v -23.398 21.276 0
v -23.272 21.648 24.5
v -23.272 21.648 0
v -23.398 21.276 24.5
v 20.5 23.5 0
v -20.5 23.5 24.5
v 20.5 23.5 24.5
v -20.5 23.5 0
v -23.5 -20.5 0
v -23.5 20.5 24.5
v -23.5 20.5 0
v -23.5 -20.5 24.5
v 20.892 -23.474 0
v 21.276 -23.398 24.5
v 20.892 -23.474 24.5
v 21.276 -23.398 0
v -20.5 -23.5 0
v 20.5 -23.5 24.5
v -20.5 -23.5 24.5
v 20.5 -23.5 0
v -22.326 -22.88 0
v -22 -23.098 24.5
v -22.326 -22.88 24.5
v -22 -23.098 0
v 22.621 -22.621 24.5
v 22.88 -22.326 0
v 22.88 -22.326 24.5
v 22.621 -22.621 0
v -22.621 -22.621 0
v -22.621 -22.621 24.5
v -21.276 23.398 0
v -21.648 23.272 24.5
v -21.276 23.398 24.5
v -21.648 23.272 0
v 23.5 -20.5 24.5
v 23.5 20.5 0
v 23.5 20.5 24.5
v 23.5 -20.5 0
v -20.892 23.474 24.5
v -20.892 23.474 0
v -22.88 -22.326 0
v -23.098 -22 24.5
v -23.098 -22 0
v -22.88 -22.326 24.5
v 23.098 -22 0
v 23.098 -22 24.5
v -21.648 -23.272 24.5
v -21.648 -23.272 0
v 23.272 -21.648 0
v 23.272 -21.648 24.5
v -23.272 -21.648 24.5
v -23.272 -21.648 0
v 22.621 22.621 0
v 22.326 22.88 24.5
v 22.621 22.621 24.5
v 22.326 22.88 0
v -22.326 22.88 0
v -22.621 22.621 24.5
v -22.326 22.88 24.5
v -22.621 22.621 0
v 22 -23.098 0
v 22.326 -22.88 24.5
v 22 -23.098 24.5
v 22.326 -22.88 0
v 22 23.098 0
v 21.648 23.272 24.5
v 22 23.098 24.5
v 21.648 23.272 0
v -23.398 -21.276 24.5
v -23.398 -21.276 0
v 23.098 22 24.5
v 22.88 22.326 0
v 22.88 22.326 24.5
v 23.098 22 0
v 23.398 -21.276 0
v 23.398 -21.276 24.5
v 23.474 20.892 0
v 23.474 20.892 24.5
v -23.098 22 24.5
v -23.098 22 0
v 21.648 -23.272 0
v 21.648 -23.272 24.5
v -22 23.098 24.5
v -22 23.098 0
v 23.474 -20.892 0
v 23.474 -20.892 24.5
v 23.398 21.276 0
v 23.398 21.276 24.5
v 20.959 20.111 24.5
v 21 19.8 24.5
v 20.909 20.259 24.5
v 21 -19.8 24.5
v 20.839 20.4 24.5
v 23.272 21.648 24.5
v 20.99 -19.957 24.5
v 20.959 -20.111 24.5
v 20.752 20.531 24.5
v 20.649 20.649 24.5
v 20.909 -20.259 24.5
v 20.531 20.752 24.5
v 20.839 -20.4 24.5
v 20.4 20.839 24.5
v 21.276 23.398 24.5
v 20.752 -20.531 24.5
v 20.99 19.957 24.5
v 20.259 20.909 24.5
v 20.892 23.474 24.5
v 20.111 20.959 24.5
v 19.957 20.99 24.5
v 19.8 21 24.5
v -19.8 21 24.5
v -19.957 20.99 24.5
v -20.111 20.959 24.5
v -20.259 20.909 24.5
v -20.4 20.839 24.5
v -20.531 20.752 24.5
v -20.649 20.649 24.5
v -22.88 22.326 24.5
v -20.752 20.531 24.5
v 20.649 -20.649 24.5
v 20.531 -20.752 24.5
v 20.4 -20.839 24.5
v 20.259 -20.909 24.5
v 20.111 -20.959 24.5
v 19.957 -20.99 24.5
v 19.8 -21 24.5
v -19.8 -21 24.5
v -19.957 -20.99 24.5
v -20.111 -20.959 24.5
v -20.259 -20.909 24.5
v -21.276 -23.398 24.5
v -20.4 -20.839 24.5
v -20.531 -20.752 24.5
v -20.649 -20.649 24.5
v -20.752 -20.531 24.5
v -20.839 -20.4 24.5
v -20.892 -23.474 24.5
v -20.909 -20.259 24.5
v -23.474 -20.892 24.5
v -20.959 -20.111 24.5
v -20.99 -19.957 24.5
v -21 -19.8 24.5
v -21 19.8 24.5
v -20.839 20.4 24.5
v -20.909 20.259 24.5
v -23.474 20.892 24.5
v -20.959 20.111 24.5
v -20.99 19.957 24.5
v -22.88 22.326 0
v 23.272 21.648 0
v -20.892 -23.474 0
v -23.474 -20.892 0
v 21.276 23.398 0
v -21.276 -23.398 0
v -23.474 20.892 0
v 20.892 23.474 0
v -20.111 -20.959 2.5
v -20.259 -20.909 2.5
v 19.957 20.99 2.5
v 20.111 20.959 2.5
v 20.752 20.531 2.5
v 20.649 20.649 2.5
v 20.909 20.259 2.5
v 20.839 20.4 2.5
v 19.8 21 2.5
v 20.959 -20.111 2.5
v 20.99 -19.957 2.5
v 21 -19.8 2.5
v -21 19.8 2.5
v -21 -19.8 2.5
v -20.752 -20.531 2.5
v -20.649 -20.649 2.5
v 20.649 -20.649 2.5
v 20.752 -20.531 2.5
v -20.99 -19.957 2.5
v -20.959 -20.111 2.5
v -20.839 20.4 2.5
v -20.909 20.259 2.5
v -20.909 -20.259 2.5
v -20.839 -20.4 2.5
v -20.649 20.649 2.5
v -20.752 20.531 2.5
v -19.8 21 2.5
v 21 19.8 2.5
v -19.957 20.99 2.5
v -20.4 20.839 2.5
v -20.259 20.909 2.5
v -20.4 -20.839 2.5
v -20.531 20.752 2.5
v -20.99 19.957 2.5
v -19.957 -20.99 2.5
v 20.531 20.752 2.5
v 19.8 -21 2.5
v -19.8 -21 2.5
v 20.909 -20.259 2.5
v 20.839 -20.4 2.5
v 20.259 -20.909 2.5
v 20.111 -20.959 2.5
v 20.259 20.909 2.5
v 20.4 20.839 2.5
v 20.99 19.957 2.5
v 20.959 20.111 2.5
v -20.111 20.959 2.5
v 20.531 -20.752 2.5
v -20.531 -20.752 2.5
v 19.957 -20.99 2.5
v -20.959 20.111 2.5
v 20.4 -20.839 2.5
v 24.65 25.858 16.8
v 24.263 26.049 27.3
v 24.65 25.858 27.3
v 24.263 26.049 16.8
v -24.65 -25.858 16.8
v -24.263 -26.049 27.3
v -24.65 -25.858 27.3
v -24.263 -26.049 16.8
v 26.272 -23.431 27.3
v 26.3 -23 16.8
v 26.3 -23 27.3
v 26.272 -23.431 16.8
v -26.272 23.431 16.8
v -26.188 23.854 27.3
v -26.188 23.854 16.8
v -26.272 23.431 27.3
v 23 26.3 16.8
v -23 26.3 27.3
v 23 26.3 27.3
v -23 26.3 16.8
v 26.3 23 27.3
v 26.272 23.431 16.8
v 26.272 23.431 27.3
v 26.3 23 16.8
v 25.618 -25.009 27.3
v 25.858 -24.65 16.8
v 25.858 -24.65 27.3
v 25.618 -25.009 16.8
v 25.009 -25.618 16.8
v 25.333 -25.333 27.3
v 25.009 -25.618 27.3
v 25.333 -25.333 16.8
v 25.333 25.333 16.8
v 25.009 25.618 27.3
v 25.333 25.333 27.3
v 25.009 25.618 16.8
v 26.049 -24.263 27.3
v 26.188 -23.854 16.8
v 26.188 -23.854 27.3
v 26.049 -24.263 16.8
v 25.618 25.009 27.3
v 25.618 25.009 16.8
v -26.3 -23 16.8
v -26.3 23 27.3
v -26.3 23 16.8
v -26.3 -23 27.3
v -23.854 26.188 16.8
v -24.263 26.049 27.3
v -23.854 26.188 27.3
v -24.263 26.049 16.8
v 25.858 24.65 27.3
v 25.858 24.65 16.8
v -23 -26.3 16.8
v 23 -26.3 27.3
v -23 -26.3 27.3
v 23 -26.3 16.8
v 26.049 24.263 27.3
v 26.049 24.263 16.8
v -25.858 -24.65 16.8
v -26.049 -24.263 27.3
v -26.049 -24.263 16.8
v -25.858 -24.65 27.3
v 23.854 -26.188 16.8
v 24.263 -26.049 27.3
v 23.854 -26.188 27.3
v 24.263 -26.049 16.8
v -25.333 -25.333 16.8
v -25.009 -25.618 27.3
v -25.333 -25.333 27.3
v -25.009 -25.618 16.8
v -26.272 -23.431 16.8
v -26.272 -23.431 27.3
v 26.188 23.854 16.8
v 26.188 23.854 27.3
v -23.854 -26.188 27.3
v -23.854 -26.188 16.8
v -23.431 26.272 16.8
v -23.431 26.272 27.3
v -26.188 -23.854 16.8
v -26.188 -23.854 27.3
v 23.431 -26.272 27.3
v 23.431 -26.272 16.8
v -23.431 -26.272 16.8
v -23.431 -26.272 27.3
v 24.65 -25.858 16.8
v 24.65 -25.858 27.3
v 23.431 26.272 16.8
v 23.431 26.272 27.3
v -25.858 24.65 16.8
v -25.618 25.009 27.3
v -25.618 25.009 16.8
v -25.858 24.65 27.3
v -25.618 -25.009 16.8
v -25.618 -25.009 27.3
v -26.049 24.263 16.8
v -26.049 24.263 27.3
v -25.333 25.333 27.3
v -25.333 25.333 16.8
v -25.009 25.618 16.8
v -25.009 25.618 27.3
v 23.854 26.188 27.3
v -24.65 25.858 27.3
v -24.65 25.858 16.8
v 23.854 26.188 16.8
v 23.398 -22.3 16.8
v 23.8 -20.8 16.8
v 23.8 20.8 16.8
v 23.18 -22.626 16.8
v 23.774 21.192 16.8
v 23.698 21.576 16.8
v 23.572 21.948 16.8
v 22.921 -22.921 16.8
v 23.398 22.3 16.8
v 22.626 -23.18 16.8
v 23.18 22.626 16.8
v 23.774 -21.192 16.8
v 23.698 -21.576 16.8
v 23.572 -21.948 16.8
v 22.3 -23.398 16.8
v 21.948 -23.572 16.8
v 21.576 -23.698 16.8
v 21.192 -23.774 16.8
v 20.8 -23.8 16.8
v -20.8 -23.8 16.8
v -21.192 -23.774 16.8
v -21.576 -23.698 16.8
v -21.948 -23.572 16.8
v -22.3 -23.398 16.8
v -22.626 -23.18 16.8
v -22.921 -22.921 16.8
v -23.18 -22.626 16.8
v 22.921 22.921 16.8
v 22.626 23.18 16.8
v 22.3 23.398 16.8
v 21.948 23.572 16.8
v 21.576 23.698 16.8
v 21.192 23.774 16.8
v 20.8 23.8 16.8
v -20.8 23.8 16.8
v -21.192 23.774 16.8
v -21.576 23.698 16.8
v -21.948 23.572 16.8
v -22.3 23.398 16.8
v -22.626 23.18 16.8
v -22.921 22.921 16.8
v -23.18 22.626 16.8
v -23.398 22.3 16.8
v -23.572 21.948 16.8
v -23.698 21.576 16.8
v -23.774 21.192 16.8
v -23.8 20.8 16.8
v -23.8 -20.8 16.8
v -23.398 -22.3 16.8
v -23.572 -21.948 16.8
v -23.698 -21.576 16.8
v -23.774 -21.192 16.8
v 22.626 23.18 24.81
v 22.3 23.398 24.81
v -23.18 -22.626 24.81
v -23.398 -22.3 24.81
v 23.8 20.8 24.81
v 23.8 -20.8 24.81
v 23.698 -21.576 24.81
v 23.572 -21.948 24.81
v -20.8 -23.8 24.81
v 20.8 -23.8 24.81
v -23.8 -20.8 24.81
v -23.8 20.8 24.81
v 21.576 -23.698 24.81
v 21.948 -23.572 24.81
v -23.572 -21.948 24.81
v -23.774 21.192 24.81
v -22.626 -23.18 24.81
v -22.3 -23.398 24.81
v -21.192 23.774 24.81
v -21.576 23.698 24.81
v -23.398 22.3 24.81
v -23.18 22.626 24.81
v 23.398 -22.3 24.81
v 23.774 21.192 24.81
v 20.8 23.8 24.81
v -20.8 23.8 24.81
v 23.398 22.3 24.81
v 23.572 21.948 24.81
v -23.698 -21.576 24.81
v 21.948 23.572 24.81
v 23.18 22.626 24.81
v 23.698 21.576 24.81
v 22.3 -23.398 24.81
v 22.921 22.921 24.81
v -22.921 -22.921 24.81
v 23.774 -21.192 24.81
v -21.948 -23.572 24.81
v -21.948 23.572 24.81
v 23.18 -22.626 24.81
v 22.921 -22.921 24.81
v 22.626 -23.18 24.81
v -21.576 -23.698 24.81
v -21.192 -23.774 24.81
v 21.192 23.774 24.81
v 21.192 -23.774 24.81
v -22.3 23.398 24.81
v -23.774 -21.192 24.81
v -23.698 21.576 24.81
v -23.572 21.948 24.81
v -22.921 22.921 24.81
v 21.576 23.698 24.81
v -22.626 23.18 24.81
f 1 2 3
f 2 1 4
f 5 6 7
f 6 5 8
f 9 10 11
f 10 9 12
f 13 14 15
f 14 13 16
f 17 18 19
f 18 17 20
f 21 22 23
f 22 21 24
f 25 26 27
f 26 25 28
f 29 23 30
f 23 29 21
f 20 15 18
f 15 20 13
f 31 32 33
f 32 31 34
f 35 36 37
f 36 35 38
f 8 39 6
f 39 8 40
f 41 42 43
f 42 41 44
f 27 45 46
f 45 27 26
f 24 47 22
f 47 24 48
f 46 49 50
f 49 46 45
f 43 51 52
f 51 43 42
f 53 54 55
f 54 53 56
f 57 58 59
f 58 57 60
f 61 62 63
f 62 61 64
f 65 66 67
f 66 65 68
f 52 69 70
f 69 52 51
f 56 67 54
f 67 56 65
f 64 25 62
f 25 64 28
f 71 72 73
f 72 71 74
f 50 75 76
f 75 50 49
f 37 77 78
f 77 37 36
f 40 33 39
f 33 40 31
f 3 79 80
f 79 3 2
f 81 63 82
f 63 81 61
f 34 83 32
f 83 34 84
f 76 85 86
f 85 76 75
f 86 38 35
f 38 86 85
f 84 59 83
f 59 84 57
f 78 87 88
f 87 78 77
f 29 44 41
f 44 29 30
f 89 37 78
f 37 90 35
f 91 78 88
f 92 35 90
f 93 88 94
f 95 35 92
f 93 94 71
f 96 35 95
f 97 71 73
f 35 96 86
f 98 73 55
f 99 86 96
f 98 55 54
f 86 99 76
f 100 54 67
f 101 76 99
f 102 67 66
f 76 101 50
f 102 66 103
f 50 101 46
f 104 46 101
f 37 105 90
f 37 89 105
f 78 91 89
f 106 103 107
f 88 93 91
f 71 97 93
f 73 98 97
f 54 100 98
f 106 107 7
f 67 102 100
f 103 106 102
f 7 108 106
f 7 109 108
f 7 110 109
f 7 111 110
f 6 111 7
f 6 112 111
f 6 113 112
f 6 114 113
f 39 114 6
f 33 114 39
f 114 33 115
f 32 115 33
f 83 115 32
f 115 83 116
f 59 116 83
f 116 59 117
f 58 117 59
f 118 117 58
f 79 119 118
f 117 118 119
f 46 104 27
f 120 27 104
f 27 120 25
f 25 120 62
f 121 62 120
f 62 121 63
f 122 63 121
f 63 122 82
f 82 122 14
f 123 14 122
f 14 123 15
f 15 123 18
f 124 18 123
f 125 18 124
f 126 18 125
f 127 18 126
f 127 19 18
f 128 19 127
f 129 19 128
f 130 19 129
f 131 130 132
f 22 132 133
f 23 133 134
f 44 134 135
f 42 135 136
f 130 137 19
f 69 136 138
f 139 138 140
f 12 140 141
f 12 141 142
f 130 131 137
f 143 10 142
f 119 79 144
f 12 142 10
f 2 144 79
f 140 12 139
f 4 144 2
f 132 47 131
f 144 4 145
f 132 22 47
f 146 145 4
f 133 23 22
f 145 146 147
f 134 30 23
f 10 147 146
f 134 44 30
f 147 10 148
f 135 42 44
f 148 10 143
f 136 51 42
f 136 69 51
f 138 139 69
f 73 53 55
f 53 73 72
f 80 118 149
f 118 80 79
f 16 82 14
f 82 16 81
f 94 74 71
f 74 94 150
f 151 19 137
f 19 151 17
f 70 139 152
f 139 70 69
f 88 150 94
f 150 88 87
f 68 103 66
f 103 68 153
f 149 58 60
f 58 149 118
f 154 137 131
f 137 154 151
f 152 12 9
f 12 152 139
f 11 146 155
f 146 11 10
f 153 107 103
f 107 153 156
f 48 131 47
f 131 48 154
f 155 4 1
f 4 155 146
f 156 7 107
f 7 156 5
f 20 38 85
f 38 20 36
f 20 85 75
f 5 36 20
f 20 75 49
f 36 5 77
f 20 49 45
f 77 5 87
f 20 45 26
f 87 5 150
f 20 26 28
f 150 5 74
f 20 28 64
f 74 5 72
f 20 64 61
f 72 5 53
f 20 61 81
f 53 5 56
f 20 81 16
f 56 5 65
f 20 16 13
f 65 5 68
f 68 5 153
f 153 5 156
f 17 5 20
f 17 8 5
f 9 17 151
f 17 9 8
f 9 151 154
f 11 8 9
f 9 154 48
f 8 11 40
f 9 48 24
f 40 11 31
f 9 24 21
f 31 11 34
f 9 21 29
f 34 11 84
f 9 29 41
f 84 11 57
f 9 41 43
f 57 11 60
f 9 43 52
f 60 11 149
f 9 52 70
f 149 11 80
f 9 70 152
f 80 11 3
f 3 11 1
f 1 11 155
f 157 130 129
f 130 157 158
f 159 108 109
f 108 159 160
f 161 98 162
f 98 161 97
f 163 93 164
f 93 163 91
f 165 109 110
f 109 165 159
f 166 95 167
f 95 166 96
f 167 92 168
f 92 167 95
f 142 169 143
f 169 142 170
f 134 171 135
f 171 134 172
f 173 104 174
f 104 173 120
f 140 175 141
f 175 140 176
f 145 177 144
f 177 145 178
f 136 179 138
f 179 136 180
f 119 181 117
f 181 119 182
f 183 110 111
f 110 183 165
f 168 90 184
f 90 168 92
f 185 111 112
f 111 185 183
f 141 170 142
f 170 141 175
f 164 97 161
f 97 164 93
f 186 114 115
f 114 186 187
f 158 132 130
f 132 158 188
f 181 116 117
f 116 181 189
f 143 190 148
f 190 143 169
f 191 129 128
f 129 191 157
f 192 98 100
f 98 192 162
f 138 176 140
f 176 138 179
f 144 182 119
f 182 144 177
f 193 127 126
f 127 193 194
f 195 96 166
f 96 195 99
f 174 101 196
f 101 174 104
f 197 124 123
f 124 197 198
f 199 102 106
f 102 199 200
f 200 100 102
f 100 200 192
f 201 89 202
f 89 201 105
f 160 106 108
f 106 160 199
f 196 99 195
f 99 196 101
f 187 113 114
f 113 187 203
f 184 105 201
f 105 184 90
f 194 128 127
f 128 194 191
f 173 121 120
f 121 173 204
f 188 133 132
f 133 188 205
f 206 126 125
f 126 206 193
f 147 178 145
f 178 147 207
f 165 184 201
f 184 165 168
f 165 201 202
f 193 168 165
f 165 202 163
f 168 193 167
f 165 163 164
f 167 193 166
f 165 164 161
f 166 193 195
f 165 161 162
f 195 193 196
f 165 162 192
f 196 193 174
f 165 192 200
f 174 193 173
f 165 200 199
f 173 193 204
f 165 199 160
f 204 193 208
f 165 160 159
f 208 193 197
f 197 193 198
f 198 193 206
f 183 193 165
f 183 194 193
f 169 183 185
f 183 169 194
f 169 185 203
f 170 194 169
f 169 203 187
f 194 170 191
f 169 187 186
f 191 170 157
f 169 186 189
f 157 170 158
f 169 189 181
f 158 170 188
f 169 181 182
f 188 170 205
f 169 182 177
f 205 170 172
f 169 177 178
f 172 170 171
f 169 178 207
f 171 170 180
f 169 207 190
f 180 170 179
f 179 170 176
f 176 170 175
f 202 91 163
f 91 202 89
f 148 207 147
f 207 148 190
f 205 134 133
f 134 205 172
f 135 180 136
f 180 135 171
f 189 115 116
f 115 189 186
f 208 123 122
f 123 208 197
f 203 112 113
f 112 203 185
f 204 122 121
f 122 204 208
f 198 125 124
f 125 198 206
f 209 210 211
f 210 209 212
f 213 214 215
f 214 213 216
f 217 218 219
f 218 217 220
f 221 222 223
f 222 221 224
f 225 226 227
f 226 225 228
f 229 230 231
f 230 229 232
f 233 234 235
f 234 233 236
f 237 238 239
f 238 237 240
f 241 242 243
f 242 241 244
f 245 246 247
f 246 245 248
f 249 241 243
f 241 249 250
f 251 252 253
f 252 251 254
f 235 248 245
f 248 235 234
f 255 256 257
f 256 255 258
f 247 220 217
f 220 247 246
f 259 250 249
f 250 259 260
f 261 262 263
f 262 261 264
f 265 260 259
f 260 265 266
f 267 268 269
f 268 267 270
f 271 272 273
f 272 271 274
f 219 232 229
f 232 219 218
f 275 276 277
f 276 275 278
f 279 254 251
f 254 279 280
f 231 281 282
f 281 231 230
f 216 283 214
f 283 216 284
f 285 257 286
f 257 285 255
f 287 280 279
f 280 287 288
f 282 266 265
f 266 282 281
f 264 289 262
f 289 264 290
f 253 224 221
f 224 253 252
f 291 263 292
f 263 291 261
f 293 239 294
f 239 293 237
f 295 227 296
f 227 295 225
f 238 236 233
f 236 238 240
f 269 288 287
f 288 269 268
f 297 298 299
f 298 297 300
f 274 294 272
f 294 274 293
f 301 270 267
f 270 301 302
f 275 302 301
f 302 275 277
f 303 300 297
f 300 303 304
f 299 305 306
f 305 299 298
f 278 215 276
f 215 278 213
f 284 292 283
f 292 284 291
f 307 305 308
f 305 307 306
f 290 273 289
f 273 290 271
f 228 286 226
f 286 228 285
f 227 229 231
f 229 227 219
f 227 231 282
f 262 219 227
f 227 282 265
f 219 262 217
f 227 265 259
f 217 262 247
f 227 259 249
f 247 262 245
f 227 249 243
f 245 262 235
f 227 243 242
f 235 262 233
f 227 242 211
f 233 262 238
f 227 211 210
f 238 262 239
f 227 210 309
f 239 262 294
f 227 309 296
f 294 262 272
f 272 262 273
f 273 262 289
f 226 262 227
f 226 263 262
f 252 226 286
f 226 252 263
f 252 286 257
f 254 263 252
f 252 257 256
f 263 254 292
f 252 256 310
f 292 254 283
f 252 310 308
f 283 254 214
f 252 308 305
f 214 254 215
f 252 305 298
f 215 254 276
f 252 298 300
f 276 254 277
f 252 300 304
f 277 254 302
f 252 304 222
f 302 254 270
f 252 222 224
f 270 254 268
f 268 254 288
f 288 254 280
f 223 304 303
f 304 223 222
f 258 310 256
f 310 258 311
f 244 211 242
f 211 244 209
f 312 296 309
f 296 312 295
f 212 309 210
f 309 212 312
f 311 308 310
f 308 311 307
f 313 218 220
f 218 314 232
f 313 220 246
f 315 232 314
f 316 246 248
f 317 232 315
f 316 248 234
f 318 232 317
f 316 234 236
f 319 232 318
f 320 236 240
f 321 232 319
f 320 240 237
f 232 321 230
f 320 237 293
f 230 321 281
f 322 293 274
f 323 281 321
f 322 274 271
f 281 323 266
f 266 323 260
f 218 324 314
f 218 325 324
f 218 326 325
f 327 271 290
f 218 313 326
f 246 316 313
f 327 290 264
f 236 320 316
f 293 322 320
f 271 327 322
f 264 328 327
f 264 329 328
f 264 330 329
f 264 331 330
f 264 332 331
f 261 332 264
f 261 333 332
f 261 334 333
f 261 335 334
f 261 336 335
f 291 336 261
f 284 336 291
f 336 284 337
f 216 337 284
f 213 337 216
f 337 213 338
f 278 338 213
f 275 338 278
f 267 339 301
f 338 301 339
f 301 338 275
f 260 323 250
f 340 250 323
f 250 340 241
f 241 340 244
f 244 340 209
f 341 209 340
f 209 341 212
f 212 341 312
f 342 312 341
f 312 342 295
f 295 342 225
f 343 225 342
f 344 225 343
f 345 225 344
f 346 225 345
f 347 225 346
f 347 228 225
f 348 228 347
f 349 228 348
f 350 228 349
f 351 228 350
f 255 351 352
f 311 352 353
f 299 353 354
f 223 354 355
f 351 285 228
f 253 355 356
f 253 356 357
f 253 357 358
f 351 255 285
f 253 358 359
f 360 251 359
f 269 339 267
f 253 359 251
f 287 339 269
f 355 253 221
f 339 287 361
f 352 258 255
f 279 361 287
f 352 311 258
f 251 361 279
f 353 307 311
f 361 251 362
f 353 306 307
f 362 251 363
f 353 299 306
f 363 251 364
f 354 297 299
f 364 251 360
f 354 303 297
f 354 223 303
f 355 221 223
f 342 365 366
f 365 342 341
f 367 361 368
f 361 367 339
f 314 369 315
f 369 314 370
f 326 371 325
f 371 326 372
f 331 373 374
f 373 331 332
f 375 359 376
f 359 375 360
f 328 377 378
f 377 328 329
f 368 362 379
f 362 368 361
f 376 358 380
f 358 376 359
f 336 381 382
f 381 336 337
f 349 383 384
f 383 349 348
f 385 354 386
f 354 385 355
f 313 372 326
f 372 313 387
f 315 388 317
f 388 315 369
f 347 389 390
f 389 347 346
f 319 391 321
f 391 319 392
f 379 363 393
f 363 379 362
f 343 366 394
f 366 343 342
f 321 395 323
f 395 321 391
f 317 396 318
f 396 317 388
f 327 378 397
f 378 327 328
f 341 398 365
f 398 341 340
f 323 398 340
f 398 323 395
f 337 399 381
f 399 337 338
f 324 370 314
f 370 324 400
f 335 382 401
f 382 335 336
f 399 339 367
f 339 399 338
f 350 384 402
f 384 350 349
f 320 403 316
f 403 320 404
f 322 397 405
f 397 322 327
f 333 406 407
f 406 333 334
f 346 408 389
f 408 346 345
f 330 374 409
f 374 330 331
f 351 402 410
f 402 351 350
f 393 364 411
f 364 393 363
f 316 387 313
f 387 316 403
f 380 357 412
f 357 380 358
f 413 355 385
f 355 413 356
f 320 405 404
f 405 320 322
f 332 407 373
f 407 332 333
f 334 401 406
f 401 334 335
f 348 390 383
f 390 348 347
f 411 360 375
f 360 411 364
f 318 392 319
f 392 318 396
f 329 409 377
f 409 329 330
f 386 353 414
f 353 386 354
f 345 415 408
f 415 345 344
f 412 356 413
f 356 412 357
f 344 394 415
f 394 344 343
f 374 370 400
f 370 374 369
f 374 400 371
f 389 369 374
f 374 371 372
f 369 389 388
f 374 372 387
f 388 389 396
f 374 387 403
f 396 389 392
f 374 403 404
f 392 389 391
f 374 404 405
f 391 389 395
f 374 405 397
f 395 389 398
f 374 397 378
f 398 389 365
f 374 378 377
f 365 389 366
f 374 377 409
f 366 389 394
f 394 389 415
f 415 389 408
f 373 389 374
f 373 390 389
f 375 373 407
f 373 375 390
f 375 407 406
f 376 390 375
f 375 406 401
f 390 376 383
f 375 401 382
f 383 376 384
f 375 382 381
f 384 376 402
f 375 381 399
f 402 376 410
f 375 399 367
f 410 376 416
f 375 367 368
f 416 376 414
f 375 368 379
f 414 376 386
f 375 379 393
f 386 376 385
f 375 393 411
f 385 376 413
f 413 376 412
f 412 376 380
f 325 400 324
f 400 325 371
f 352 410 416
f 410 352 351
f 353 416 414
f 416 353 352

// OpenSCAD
$fn = 48;

wall = 2.5;
clearance = 0.30;

cavity_x = 42;
cavity_y = 42;
cavity_z = 22;

base_bottom = wall;
base_outer_x = cavity_x + 2 * wall;
base_outer_y = cavity_y + 2 * wall;
base_height = base_bottom + cavity_z;

lid_top = wall;
lid_skirt_h = 8;
lid_inner_x = base_outer_x + 2 * clearance;
lid_inner_y = base_outer_y + 2 * clearance;
lid_outer_x = lid_inner_x + 2 * wall;
lid_outer_y = lid_inner_y + 2 * wall;
lid_bottom_z = base_height + clearance - lid_skirt_h;
lid_top_z = base_height + clearance;

module rounded_box(size, r) {
    hull() {
        for (x = [-size[0] / 2 + r, size[0] / 2 - r])
        for (y = [-size[1] / 2 + r, size[1] / 2 - r])
            translate([x, y, 0])
                cylinder(h = size[2], r = r);
    }
}

module base() {
    difference() {
        rounded_box([base_outer_x, base_outer_y, base_height], 3);
        translate([0, 0, base_bottom])
            rounded_box([cavity_x, cavity_y, cavity_z + 0.02], 1.2);
    }
}

module lid() {
    difference() {
        union() {
            translate([0, 0, lid_top_z])
                rounded_box([lid_outer_x, lid_outer_y, lid_top], 3.3);

            translate([0, 0, lid_bottom_z])
                rounded_box([lid_outer_x, lid_outer_y, lid_skirt_h], 3.3);
        }

        translate([0, 0, lid_bottom_z - 0.01])
            rounded_box([lid_inner_x, lid_inner_y, lid_skirt_h + 0.02], 3.0);
    }
}

color("lightsteelblue") base();
color("gainsboro") lid();
